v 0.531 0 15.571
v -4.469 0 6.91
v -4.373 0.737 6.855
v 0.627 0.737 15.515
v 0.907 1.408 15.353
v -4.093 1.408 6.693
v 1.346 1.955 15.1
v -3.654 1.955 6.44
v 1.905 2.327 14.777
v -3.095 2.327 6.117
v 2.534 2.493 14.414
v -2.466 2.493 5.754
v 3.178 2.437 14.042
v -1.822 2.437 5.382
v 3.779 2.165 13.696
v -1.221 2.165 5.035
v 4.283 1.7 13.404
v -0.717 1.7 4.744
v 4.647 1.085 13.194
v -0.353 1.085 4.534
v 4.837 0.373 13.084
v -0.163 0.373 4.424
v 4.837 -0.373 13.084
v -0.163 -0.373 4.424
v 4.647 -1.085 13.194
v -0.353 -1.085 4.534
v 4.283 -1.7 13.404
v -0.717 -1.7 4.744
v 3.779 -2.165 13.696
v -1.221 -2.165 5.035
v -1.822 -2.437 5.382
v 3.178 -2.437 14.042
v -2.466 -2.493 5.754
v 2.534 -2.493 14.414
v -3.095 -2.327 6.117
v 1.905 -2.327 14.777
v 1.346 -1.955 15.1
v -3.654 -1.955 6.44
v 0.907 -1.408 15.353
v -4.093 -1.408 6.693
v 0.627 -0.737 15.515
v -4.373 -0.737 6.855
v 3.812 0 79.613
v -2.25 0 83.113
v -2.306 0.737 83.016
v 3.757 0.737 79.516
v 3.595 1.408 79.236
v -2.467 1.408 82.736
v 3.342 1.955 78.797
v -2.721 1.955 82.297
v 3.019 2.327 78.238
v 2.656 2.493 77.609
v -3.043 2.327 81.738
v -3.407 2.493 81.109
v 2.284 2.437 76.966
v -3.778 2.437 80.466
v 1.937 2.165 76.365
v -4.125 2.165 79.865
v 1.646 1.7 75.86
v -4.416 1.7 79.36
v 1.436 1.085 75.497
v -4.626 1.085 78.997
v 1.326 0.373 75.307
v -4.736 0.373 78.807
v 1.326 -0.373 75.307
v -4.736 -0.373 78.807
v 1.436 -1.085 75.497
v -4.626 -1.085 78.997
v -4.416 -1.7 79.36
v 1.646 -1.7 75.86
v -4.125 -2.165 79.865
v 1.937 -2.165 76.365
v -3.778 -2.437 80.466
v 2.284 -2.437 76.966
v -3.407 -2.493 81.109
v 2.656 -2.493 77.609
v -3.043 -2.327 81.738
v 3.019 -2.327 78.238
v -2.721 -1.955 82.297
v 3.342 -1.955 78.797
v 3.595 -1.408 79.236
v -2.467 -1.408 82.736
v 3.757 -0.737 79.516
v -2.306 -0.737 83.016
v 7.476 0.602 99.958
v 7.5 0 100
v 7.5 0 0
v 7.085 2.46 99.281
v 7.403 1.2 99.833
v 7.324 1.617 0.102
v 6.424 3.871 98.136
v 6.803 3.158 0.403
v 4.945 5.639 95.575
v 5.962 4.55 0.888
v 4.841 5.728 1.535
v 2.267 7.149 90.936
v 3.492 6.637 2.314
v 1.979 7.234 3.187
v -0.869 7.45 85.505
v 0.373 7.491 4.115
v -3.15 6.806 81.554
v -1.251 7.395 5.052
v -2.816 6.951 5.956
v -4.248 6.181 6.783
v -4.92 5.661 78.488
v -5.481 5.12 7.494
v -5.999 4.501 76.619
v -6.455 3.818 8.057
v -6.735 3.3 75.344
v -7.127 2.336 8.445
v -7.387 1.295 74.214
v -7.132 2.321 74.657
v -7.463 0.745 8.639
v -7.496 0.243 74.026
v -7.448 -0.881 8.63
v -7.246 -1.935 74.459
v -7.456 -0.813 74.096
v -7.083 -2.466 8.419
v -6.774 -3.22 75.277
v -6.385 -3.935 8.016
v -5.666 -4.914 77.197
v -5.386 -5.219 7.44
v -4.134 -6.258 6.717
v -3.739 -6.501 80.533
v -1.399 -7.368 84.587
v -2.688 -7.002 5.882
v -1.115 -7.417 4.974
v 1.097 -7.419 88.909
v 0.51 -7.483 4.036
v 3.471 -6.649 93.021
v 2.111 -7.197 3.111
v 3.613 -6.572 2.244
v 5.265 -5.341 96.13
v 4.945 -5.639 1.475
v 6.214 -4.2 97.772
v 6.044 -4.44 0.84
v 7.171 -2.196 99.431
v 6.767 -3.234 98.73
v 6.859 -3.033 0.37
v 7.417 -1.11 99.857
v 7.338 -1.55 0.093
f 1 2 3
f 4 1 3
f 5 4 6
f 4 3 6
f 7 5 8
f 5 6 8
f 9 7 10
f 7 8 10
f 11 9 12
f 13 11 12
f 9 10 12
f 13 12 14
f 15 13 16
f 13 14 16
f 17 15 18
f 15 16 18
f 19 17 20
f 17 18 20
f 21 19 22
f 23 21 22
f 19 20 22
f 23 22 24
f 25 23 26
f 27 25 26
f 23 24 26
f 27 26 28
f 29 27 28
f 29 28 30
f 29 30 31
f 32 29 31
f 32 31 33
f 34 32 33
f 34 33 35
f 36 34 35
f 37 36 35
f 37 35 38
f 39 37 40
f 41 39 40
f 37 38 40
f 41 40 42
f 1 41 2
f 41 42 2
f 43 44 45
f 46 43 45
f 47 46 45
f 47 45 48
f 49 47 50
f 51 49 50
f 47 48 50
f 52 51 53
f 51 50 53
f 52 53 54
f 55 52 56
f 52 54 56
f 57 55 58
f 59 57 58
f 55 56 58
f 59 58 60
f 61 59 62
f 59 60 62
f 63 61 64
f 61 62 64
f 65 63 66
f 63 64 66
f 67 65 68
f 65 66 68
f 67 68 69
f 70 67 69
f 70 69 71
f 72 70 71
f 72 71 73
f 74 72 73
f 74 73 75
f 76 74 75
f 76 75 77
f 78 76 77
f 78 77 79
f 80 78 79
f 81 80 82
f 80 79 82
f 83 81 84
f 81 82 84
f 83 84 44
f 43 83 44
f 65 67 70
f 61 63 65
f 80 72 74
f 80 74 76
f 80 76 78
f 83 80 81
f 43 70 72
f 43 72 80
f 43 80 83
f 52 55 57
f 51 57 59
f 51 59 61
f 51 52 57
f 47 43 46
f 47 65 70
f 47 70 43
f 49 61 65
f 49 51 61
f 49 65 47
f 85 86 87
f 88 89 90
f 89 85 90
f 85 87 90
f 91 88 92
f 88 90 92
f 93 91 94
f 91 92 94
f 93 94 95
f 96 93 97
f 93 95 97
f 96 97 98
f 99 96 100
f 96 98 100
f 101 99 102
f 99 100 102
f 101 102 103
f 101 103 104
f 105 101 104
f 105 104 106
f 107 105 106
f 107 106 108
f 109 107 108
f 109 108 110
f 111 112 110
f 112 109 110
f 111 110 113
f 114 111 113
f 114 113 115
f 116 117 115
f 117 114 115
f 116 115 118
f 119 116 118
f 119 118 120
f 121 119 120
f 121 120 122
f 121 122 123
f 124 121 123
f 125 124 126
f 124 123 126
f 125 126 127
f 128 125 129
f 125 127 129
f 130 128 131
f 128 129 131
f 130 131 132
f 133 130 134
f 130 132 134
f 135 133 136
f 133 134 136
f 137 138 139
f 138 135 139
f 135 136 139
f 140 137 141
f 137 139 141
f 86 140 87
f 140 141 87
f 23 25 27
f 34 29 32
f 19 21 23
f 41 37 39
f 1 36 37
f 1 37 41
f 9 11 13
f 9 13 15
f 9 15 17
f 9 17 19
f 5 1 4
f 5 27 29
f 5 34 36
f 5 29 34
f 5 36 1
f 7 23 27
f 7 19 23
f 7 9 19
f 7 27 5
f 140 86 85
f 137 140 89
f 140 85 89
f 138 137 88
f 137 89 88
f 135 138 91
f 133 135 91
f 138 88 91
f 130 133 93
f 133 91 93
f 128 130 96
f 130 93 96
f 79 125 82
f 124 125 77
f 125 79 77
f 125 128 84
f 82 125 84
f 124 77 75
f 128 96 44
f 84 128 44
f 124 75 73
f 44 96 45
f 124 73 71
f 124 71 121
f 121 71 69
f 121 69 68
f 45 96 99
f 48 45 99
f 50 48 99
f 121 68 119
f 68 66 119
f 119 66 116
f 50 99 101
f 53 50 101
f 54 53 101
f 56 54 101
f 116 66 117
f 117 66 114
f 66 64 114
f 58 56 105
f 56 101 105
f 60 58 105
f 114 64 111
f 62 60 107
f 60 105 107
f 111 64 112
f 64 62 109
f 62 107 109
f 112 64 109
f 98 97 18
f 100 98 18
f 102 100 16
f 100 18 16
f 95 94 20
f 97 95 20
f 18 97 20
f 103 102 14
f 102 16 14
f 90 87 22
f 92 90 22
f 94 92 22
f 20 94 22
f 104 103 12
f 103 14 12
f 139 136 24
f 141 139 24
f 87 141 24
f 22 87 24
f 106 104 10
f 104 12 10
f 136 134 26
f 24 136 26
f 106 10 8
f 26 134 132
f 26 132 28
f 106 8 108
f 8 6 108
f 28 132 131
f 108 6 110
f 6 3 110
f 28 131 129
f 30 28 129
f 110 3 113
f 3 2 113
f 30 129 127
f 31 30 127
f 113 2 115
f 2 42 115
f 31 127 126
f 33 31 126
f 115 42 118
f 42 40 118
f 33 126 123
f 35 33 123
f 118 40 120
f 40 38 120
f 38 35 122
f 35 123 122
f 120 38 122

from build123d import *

# Parameters (mm, degrees)
SKETCH2_R           = 7.5
BOSS_EXTRUDE1_DEPTH = 100
CUT_EXTRUDE1_DEPTH  = 50
SKETCH5_R           = 2.5
CUT_EXTRUDE2_DEPTH  = 10
SKETCH6_R           = 2.5
CUT_EXTRUDE3_DEPTH  = 7


with BuildPart() as part:
    # Sketch2 → Boss-Extrude1 (new body)
    with BuildSketch(Plane.XY):
        Circle(SKETCH2_R)
    extrude(amount=BOSS_EXTRUDE1_DEPTH)

    # Sketch3 → Cut-Extrude1 (cut, symmetric)
    with BuildSketch(Plane(origin=(0, 0, 0), x_dir=(1, 0, 0), z_dir=(0, 1, 0))):
        Polygon((7.5, 0), (-16.600154846, -13.914230888), (-16.600154846, 6.795957579), (7.5, 6.795957579), align=None)
        Polygon((7.5, -100), (-10.5, -68.823085464), (-10.5, -108.823085464), (7.5, -108.823085464), align=None)
    extrude(amount=CUT_EXTRUDE1_DEPTH, both=True, mode=Mode.SUBTRACT)

    # Sketch5 → Cut-Extrude2 (cut)
    with BuildSketch(Plane(origin=(1.875, 0, 3.247595264), x_dir=(-0.8660254037844379, 0, 0.5000000000000013), z_dir=(-0.5000000000000013, 0, -0.8660254037844379))):
        with Locations((4.825317547, 0)):
            Circle(SKETCH5_R)
    extrude(amount=-CUT_EXTRUDE2_DEPTH, mode=Mode.SUBTRACT)

    # Sketch6 → Cut-Extrude3 (cut)
    with BuildSketch(Plane(origin=(-37.676270189, 0, 21.752404736), x_dir=(0.5000000000000042, 0, 0.8660254037844363), z_dir=(-0.8660254037844363, 0, 0.5000000000000042))):
        with Locations((68.352540378, 0)):
            Circle(SKETCH6_R)
    extrude(amount=-CUT_EXTRUDE3_DEPTH, mode=Mode.SUBTRACT)


solid = part.part
